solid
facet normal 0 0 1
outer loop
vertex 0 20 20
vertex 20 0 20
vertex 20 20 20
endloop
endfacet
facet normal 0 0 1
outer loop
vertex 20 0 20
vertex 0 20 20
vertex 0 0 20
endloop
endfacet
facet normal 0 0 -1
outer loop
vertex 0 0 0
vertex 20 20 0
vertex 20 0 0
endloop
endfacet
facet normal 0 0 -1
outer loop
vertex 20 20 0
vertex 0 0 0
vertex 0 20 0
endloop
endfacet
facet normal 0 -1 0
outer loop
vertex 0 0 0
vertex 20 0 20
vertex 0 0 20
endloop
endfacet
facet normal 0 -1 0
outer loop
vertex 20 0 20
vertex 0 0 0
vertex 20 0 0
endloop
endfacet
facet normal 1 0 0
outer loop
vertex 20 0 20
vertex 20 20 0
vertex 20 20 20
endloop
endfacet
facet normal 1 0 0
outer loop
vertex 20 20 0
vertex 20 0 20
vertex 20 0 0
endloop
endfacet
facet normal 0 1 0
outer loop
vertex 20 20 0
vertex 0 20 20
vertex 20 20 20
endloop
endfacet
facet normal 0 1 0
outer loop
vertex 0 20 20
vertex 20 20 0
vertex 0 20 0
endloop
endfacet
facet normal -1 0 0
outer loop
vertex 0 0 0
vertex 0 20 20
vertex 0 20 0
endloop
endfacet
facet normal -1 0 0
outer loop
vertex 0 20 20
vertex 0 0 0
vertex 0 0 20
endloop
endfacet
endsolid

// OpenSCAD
big = true;
if (big) cube([20, 20, 20]); else cube([5, 5, 5]);
